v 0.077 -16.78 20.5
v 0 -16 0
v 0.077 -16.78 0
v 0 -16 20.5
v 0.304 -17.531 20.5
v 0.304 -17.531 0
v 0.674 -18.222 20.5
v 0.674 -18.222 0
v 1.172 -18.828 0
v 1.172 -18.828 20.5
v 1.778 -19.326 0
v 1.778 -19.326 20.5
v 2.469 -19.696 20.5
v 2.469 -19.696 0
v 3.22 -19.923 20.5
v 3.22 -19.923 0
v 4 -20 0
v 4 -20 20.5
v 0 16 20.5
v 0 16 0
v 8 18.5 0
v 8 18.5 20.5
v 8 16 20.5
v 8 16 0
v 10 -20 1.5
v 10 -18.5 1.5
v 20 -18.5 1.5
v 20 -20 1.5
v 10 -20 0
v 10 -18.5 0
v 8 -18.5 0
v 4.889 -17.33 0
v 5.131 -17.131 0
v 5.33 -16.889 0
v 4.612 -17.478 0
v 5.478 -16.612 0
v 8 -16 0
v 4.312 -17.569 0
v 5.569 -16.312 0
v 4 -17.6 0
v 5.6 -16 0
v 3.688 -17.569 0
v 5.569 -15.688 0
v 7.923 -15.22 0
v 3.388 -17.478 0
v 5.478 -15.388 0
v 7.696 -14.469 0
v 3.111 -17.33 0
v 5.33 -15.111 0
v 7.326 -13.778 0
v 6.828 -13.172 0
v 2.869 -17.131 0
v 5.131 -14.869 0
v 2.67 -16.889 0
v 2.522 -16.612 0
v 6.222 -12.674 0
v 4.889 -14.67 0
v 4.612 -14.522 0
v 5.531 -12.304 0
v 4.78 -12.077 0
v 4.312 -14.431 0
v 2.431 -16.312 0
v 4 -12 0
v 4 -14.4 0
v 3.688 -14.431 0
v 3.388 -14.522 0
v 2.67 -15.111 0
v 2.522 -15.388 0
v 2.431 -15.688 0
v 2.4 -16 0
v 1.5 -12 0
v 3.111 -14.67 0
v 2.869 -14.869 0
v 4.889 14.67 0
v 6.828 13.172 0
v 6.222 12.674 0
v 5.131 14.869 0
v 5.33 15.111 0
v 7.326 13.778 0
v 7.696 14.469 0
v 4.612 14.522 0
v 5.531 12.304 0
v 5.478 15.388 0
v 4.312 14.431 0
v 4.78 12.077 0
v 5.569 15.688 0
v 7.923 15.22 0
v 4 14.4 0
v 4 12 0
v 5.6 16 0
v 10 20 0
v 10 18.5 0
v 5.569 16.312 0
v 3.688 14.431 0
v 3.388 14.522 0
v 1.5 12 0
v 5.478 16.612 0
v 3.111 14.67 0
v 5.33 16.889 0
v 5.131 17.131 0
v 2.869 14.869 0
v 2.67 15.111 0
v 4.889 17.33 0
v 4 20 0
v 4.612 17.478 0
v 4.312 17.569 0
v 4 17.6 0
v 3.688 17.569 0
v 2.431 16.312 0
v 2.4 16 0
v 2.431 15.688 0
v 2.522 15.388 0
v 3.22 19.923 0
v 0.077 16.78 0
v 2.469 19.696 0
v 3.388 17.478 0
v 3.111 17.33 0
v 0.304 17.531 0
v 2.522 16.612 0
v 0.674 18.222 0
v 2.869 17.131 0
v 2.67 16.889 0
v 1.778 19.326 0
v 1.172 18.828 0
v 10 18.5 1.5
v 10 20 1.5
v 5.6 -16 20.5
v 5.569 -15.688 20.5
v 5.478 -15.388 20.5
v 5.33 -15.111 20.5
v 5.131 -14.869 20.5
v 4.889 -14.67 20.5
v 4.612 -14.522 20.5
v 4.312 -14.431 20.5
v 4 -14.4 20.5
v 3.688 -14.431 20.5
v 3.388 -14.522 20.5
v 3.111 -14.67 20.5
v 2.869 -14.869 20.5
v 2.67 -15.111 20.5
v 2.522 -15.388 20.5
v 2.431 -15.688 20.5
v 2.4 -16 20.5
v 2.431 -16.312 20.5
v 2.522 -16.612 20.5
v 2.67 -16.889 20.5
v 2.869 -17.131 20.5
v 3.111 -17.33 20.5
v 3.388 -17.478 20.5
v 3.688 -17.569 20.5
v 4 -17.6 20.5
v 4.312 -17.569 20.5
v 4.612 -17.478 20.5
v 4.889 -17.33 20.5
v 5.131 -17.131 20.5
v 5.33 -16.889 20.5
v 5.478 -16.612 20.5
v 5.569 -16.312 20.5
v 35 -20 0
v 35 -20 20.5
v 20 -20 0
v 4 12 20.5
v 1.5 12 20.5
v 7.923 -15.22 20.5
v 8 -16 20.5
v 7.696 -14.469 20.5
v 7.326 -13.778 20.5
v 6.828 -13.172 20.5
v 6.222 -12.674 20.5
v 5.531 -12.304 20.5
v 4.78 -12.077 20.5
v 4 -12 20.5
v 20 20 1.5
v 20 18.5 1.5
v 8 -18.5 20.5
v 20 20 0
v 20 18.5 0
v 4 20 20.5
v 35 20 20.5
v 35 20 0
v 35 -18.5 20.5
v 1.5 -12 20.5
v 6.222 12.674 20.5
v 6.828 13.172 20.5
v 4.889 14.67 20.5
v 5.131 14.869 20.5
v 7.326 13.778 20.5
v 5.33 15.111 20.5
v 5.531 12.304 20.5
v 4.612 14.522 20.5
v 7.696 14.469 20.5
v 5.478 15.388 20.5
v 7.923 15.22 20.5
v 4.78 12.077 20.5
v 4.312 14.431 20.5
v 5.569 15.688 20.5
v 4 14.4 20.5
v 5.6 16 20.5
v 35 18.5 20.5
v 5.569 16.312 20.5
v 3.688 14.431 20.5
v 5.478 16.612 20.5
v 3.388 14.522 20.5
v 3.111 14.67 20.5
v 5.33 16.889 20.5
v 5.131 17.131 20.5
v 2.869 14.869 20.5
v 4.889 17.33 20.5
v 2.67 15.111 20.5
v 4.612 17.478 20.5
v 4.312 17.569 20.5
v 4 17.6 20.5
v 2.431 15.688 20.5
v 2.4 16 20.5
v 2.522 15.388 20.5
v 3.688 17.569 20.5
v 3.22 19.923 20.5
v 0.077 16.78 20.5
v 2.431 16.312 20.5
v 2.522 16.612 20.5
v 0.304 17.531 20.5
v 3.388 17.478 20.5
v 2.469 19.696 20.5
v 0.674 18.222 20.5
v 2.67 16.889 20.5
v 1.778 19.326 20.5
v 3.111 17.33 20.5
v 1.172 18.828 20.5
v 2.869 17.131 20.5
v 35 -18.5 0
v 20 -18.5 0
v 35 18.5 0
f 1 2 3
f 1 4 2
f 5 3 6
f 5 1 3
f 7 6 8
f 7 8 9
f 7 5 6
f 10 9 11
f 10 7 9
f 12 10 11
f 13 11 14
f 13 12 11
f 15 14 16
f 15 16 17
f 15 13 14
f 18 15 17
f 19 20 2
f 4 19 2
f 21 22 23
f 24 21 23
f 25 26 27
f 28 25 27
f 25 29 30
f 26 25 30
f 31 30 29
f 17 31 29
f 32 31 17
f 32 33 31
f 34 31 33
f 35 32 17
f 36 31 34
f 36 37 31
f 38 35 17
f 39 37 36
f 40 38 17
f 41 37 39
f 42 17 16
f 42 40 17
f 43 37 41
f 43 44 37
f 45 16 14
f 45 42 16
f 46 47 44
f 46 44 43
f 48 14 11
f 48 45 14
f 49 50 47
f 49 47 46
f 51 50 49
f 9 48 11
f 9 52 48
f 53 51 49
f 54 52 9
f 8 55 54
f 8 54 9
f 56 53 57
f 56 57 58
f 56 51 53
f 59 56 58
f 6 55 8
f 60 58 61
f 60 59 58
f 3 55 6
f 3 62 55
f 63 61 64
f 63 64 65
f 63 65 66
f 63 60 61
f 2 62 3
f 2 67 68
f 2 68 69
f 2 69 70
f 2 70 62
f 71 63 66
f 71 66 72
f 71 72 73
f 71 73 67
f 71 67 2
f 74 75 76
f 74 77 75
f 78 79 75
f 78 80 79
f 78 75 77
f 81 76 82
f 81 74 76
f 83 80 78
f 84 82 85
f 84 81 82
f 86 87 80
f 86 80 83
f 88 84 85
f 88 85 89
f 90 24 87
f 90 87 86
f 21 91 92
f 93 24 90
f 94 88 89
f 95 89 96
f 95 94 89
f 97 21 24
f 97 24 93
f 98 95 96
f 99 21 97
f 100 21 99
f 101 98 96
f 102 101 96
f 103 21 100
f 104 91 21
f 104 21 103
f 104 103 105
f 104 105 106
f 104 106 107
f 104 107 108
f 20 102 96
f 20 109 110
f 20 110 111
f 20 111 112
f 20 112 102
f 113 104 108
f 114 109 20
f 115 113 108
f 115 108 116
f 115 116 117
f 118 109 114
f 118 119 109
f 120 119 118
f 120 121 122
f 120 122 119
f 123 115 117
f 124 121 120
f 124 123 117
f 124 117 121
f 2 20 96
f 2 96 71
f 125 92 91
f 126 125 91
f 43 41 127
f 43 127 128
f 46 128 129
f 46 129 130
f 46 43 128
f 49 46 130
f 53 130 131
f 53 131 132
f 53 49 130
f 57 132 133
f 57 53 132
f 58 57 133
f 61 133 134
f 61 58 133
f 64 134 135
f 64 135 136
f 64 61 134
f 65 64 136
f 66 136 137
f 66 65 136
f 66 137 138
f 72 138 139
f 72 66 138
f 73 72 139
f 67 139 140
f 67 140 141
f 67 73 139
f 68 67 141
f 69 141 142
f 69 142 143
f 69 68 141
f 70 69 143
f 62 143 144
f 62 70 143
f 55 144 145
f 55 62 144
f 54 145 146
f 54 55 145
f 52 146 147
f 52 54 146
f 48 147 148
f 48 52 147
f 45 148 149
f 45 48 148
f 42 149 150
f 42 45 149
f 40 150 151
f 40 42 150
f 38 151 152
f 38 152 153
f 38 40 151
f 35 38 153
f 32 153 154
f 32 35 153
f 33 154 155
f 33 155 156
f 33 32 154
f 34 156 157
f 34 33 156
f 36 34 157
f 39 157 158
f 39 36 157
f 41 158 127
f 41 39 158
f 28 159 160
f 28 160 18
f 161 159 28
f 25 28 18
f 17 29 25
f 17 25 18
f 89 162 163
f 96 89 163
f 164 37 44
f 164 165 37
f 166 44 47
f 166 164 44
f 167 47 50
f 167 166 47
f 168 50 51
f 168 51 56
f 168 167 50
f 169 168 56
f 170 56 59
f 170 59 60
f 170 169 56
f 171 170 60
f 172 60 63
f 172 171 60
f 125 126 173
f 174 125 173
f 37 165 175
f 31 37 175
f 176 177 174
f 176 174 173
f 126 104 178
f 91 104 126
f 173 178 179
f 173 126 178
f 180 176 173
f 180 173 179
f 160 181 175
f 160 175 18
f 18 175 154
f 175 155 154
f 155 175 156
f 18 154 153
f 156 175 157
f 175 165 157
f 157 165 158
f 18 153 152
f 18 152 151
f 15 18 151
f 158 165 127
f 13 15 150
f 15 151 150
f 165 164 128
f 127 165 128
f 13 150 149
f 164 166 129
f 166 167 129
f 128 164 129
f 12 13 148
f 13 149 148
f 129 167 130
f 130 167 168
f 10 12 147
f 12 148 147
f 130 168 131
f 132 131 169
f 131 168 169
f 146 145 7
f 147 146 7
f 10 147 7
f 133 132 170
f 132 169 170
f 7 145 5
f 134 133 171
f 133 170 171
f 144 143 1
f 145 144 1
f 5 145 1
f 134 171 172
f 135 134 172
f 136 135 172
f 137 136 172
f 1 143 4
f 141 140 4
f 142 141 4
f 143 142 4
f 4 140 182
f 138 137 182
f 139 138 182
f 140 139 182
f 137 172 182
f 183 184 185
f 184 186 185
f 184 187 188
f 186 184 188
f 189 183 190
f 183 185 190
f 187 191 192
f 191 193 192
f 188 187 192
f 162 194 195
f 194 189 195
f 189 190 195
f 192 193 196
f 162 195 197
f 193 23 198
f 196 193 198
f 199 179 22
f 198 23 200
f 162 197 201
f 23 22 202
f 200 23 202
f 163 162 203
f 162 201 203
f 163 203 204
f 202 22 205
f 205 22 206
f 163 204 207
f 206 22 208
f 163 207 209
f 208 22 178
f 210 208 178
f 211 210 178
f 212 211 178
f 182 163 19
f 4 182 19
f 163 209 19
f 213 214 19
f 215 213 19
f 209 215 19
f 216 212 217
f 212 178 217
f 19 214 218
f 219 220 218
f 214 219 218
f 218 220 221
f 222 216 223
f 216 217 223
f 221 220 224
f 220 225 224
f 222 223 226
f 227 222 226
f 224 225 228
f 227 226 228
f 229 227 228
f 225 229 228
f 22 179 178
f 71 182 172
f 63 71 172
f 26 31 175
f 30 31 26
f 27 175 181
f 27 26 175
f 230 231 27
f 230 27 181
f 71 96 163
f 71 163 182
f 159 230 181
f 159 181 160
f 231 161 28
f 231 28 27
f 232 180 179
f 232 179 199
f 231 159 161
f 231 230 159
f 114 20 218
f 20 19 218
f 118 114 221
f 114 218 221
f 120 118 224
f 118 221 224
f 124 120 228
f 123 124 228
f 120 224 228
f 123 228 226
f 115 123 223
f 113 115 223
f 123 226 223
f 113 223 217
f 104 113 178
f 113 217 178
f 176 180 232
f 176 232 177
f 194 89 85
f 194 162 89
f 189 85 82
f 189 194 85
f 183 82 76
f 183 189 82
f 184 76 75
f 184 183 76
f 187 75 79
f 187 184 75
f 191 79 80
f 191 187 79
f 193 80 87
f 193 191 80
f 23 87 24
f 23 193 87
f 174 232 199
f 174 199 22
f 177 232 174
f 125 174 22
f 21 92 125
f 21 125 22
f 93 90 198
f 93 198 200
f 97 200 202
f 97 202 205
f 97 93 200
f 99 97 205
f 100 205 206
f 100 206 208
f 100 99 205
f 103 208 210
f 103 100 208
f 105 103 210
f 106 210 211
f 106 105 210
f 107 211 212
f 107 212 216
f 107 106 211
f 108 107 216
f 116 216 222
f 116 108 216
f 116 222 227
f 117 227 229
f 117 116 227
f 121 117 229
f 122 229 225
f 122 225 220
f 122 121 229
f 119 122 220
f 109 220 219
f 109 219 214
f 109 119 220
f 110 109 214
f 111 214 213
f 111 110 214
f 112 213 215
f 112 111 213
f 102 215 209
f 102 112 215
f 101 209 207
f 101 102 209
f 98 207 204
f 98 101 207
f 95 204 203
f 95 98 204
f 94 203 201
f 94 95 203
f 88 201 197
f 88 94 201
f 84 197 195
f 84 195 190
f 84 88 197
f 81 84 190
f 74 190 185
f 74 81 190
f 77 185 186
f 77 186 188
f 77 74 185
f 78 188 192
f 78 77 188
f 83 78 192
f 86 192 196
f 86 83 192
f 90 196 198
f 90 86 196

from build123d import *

# Parameters (mm, degrees)
SKETCH_R     = 1.6
PAD_DEPTH    = 20.5
SKETCH001_W  = 10
SKETCH001_H  = 100
POCKET_DEPTH = 1.5
FILLET_R     = 4


with BuildPart() as part:
    # Sketch → Pad (new body)
    with BuildSketch(Plane.XY):
        Polygon((0, 12), (0, 20), (35, 20), (35, 18.5), (8, 18.5), (8, 12), (1.5, 12), (1.5, -12), (8, -12), (8, -18.5), (35, -18.5), (35, -20), (0, -20), (0, -12), align=None)
        with Locations((4, 16)):
            Circle(SKETCH_R, mode=Mode.SUBTRACT)
        with Locations((4, -16)):
            Circle(SKETCH_R, mode=Mode.SUBTRACT)
    extrude(amount=PAD_DEPTH)

    # Sketch001 → Pocket (cut)
    with BuildSketch(Plane.XY):
        with Locations((15, 0)):
            Rectangle(SKETCH001_W, SKETCH001_H)
    extrude(amount=POCKET_DEPTH, mode=Mode.SUBTRACT)

    # Fillet
    fillet_edges = [part.edges().sort_by_distance(p)[0] for p in [
        (0, -20, 10.25),
        (8, -12, 10.25),
        (8, 12, 10.25),
        (0, 20, 10.25),
    ]]
    fillet(fillet_edges, radius=FILLET_R)


solid = part.part
